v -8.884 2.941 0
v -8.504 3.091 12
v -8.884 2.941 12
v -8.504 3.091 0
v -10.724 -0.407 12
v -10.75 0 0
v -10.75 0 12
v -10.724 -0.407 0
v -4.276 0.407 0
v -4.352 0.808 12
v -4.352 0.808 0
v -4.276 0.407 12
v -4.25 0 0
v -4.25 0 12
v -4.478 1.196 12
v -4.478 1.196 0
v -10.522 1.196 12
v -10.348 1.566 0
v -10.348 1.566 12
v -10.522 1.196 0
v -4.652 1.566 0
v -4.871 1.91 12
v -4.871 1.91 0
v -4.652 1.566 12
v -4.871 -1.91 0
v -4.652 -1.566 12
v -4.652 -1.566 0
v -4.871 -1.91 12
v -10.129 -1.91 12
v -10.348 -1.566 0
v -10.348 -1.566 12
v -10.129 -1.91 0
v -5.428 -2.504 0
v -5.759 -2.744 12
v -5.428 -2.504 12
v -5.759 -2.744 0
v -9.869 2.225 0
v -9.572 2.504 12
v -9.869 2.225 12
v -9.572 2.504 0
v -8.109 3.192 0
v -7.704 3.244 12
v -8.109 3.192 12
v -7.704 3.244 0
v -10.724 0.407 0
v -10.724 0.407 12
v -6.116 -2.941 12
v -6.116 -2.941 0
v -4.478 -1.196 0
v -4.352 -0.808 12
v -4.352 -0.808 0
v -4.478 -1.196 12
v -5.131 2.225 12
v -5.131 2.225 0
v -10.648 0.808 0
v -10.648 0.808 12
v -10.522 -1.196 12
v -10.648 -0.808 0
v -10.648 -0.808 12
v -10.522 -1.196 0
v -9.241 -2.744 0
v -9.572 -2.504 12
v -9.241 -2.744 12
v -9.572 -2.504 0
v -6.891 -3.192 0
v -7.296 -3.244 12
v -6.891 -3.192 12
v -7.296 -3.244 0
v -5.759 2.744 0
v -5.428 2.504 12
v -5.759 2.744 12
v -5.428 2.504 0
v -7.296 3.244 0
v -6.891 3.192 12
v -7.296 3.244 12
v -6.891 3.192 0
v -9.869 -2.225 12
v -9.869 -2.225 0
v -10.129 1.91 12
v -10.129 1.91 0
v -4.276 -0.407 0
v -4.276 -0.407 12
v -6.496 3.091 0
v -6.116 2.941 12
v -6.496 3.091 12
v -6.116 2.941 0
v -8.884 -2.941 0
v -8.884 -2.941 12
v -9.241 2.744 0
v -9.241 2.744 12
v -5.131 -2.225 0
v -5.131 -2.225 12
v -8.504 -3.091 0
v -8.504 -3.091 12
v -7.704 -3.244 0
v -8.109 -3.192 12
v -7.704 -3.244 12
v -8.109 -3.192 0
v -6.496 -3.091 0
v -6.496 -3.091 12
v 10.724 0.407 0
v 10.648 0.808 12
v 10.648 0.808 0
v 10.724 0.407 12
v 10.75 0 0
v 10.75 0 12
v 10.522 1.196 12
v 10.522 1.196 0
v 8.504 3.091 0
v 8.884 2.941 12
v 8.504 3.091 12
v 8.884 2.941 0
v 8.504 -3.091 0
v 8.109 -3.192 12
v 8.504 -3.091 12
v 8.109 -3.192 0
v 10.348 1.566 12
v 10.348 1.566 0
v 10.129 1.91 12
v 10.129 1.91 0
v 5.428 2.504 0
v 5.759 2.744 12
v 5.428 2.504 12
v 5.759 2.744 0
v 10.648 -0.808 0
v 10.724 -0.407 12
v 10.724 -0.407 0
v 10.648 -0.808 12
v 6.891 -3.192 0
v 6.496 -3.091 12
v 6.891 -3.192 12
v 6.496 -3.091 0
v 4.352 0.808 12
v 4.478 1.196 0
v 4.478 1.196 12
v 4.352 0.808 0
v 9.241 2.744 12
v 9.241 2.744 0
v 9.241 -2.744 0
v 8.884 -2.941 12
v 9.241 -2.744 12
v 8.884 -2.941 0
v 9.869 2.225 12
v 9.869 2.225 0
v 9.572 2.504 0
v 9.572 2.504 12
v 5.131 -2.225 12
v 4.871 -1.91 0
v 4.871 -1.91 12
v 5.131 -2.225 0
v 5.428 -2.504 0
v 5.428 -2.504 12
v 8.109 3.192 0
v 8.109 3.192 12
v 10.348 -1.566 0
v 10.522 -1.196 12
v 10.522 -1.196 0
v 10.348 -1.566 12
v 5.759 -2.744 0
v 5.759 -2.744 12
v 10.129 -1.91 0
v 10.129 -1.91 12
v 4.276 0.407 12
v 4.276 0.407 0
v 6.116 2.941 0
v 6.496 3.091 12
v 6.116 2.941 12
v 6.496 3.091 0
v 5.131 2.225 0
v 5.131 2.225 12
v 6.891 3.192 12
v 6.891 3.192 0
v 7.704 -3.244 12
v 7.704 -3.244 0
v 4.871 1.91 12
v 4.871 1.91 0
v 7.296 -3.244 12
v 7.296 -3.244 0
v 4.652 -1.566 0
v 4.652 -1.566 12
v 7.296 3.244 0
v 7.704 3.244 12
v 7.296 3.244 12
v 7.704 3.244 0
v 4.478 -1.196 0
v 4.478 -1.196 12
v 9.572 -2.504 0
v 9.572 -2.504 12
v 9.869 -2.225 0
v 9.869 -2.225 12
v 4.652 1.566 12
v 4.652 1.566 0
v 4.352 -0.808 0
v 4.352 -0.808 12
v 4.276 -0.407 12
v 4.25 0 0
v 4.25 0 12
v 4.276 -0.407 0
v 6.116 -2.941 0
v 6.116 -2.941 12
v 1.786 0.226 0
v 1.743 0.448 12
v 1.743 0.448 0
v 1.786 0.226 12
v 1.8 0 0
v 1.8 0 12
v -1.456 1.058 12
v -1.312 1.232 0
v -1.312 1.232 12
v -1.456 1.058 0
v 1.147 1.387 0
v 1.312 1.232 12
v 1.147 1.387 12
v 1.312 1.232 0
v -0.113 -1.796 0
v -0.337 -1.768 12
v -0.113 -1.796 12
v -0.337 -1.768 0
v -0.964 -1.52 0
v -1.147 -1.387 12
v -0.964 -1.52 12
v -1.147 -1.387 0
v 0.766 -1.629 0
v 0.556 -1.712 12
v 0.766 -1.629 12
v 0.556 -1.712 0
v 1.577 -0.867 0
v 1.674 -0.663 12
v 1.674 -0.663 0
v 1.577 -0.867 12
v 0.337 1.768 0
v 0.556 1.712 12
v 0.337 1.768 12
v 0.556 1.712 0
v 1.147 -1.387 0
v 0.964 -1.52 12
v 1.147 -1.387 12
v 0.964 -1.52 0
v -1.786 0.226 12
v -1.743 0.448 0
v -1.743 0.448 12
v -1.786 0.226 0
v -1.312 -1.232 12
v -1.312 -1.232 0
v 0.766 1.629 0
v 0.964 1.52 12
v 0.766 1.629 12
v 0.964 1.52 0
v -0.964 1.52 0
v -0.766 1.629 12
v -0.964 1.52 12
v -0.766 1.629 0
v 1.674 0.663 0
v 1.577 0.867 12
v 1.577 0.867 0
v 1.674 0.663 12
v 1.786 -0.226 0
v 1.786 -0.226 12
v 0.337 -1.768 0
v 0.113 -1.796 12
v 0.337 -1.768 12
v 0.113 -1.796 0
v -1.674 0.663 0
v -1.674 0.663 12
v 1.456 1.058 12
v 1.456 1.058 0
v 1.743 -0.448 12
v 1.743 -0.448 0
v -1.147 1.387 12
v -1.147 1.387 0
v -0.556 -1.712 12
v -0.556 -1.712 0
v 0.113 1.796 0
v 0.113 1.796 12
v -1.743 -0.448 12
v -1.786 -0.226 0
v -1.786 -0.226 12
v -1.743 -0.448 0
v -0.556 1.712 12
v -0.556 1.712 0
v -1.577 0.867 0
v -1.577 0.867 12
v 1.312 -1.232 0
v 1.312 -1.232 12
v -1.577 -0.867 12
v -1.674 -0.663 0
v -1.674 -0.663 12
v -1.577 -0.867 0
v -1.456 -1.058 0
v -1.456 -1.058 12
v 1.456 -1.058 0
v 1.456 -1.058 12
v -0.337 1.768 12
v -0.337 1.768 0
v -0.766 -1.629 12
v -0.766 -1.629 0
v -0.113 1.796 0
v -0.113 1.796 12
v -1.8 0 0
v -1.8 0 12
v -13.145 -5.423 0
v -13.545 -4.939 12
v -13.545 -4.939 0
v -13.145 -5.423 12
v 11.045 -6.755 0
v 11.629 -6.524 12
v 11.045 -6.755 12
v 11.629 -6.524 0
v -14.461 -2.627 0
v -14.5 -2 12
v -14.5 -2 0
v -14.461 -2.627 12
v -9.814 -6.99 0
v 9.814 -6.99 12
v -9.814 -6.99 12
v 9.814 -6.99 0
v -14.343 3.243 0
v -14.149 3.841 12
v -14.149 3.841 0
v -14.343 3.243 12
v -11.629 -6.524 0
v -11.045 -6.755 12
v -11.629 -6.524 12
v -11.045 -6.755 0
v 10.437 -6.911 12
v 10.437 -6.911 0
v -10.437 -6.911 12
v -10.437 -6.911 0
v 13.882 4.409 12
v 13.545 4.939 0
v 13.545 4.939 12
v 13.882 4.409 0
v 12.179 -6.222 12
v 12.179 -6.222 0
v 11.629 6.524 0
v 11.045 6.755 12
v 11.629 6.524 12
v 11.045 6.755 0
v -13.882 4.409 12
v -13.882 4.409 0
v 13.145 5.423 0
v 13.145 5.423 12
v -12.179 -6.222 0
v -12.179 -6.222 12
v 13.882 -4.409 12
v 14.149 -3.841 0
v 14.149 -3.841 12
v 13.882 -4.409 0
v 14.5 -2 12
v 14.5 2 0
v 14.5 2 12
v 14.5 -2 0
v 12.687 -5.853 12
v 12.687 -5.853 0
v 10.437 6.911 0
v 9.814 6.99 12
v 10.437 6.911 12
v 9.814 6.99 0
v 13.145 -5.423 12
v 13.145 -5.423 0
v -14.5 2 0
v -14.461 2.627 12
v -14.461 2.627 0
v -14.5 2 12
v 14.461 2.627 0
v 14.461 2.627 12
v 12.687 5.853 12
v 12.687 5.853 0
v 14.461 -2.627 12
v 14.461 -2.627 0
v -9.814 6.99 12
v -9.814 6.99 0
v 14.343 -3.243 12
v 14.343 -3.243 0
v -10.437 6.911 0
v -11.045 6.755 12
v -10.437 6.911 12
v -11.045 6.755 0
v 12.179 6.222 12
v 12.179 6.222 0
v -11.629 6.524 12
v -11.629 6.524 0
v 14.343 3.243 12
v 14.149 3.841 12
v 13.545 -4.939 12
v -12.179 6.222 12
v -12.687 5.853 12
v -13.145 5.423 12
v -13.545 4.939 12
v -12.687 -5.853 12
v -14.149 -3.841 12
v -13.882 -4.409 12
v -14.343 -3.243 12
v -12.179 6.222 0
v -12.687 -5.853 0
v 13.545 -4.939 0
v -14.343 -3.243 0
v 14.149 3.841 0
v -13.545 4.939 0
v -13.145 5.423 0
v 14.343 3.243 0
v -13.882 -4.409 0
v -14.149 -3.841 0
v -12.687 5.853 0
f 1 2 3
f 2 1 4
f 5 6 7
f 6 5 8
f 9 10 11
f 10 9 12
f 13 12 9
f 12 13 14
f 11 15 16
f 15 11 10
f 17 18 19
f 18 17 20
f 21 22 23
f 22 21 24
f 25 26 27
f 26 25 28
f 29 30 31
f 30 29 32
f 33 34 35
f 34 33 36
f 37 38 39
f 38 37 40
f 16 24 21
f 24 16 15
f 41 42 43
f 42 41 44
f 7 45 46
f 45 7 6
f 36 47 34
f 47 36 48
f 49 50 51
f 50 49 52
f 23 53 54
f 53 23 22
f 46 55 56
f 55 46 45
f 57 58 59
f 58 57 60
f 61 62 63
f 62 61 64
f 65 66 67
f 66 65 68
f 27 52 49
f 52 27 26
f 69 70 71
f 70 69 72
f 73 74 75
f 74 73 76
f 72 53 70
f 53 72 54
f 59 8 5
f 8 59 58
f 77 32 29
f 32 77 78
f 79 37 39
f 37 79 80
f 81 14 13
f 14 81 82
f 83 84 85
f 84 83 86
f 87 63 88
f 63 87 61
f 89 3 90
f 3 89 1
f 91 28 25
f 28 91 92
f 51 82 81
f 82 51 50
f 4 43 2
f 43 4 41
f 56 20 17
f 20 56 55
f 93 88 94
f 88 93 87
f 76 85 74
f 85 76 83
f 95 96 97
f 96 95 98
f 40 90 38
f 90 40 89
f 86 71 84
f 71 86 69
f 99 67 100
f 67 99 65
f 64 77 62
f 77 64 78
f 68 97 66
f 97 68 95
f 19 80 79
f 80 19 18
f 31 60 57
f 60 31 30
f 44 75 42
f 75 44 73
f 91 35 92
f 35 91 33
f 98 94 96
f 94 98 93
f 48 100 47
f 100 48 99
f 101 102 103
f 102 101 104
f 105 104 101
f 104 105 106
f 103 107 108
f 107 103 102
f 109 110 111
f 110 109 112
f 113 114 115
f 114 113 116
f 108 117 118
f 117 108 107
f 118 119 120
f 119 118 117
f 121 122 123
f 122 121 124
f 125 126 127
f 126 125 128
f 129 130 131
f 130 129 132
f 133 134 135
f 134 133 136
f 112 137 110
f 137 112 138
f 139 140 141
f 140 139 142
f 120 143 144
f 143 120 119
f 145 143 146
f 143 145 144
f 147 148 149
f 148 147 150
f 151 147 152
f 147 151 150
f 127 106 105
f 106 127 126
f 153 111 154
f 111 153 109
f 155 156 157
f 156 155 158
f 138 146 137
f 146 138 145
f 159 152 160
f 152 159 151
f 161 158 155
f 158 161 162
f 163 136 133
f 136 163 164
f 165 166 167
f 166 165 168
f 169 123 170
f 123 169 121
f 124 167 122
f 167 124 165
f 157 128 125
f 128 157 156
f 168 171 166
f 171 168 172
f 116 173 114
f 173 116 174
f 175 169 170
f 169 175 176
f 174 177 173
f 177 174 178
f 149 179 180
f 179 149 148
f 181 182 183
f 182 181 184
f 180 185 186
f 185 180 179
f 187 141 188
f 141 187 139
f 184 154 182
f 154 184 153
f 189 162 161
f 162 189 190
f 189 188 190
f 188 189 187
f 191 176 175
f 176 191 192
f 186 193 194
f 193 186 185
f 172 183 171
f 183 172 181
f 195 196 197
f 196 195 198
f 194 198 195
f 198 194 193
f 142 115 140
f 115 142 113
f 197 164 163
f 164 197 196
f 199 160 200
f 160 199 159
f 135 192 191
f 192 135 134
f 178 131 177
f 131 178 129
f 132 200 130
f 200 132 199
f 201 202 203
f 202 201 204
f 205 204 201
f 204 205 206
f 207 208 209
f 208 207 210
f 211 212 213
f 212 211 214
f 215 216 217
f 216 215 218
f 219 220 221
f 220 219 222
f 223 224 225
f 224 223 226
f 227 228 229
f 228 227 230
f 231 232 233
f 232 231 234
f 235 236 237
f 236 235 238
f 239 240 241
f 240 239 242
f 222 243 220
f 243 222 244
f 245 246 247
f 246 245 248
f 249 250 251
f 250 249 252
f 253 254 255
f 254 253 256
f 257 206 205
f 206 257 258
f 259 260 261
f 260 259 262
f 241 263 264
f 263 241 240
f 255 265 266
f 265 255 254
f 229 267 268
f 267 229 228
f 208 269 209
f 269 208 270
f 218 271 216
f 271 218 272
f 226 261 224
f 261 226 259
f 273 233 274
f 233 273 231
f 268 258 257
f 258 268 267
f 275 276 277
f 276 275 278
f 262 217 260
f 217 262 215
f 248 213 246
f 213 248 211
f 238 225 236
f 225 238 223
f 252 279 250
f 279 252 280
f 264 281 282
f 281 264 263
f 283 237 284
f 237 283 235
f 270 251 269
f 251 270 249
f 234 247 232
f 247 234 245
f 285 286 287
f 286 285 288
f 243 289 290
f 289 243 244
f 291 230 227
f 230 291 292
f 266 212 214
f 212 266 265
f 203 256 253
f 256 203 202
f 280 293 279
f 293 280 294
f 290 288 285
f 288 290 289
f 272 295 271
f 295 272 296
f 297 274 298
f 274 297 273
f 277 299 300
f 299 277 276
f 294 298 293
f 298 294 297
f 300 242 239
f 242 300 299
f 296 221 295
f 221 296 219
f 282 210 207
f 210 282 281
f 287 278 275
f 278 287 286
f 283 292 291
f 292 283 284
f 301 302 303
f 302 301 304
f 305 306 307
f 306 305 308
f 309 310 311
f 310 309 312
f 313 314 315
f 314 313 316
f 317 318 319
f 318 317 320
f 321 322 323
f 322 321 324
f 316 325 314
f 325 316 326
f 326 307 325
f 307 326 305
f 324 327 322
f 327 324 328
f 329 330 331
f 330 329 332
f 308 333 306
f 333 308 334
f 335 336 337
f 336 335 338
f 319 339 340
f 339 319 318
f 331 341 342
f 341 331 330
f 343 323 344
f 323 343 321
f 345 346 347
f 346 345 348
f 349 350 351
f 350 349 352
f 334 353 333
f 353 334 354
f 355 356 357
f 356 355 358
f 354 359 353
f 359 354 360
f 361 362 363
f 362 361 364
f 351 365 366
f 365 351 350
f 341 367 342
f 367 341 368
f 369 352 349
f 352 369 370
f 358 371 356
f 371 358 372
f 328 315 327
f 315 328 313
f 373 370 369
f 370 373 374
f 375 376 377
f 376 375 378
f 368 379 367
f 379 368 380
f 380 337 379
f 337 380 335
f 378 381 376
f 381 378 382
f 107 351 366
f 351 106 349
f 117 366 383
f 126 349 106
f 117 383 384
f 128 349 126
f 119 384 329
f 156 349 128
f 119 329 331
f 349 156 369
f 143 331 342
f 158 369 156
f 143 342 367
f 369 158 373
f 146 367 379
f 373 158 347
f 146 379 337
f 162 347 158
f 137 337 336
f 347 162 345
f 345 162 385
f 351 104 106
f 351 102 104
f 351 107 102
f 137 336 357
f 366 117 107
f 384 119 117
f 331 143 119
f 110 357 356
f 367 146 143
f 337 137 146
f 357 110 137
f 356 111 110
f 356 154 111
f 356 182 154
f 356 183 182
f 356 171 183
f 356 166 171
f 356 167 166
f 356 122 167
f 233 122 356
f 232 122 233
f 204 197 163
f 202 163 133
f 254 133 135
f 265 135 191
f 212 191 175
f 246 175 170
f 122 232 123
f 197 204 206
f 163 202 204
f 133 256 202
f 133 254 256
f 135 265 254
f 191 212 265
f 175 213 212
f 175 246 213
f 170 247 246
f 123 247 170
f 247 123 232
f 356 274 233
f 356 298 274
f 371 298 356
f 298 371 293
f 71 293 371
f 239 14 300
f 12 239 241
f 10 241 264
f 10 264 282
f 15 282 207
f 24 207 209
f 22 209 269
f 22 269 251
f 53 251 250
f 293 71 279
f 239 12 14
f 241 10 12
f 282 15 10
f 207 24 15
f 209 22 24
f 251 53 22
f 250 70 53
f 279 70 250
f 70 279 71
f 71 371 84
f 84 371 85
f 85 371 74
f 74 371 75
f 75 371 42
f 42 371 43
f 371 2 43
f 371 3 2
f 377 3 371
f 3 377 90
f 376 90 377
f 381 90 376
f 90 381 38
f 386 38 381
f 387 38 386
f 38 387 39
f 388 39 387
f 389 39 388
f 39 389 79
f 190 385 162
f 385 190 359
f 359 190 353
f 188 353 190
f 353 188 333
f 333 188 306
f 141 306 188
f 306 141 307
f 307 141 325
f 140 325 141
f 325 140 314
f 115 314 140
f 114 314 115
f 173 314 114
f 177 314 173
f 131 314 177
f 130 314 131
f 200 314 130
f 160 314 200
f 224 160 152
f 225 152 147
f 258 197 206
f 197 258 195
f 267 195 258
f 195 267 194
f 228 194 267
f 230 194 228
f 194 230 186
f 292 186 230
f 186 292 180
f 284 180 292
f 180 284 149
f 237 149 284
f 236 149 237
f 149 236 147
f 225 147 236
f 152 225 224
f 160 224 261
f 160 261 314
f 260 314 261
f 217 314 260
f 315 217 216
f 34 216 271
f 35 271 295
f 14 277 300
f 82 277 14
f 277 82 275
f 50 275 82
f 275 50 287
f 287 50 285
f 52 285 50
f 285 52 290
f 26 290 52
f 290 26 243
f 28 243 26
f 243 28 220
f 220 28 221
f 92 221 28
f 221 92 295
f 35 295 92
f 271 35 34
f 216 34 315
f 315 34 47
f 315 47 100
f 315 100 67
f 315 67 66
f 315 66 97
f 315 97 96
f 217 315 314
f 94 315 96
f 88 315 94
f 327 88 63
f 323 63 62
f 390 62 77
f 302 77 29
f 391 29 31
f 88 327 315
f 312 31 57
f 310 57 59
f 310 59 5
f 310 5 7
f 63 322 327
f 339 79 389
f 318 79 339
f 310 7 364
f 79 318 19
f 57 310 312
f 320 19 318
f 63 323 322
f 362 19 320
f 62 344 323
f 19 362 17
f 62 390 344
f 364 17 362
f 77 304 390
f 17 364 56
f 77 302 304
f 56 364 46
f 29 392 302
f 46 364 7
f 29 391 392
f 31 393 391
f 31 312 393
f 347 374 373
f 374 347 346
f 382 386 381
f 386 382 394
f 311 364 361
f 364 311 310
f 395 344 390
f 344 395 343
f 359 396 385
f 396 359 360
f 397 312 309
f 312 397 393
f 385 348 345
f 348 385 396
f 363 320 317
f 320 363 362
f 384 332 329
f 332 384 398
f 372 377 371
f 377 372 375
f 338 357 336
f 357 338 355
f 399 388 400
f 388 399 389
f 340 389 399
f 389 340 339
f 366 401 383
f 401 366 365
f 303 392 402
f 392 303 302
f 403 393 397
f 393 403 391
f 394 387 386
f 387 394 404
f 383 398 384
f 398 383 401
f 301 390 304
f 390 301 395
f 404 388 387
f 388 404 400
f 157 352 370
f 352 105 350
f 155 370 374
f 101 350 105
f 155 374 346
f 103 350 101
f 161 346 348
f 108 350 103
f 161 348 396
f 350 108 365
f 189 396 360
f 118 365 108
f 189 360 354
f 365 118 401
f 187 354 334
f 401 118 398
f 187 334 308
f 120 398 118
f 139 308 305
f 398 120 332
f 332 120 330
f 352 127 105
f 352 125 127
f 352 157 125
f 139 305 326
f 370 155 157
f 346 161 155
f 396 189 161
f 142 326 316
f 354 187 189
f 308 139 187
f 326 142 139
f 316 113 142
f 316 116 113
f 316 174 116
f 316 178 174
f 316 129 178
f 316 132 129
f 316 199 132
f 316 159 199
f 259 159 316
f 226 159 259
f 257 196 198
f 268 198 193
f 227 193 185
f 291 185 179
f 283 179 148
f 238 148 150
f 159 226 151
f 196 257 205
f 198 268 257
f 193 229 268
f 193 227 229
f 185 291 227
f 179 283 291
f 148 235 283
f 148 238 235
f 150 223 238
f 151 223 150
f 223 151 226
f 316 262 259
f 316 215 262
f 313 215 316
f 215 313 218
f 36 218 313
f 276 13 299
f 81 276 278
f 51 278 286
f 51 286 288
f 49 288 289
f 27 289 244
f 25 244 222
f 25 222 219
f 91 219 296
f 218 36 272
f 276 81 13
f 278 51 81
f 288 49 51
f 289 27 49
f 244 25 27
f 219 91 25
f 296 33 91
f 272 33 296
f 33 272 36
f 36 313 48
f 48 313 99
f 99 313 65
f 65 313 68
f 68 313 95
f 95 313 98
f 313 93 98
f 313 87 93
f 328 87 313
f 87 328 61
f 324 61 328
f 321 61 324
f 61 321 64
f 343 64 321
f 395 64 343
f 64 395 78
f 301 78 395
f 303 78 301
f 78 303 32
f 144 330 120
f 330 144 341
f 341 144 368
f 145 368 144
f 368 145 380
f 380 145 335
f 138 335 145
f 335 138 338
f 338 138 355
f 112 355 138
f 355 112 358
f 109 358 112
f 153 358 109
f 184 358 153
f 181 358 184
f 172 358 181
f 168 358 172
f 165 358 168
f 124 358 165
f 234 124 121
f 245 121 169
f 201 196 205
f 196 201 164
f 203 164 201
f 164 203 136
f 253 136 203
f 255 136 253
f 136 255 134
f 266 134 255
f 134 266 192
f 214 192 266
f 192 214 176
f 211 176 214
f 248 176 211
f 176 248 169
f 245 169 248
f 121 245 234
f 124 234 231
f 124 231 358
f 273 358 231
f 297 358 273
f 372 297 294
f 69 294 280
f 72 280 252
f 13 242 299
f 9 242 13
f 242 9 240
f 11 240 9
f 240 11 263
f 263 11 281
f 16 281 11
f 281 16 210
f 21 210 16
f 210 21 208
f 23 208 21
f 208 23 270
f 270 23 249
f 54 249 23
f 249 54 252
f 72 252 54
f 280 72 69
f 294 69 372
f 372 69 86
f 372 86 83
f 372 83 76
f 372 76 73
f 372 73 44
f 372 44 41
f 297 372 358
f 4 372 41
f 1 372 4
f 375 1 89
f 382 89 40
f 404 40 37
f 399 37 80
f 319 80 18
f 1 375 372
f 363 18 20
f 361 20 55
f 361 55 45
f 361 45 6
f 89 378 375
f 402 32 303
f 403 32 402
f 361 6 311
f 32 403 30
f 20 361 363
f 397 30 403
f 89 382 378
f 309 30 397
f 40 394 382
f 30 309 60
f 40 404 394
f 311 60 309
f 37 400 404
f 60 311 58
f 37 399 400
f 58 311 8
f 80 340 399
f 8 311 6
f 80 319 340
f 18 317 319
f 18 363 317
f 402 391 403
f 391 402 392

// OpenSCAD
$fn = 50;


difference() {
	union() {
		*color(alpha = 1.0000000000, c = "gray") {
			translate(v = [0, 7, 0]) {
				linear_extrude(height = 1) {
					text(font = "Arial:style=Bold", halign = "center", size = 4.5000000000, text = "COMMENT plate main", valign = "center");
				}
			}
		}
		*color(alpha = 1.0000000000, c = "gray") {
			translate(v = [0, 14, 0]) {
				linear_extrude(height = 1) {
					text(font = "Arial:style=Bold", halign = "center", size = 4.5000000000, text = "COMMENT description oobb_plate_shape_p_type_12_depth_2_width_1_height_12_thickness_true_both_holes", valign = "center");
				}
			}
		}
		hull() {
			translate(v = [-9.5000000000, 2.0000000000, 0]) {
				cylinder(h = 12, r = 5);
			}
			translate(v = [9.5000000000, 2.0000000000, 0]) {
				cylinder(h = 12, r = 5);
			}
			translate(v = [-9.5000000000, -2.0000000000, 0]) {
				cylinder(h = 12, r = 5);
			}
			translate(v = [9.5000000000, -2.0000000000, 0]) {
				cylinder(h = 12, r = 5);
			}
		}
	}
	union() {
		*color(alpha = 1.0000000000, c = "gray") {
			translate(v = [0, 7, 0]) {
				linear_extrude(height = 1) {
					text(font = "Arial:style=Bold", halign = "center", size = 4.5000000000, text = "COMMENT holes main", valign = "center");
				}
			}
		}
		*color(alpha = 1.0000000000, c = "gray") {
			translate(v = [0, 14, 0]) {
				linear_extrude(height = 1) {
					text(font = "Arial:style=Bold", halign = "center", size = 4.5000000000, text = "COMMENT description oobb_holes_shape_n_type_2_width_1_height_12_thickness_true_both_holes", valign = "center");
				}
			}
		}
		translate(v = [-7.5000000000, 0.0000000000, 0]) {
			translate(v = [0, 0, -50]) {
				cylinder(h = 100, r = 3.2500000000);
			}
		}
		translate(v = [7.5000000000, 0.0000000000, 0]) {
			translate(v = [0, 0, -50]) {
				cylinder(h = 100, r = 3.2500000000);
			}
		}
		translate(v = [-7.5000000000, 0.0000000000, 0]) {
			translate(v = [0, 0, -50]) {
				cylinder(h = 100, r = 1.8000000000);
			}
		}
		translate(v = [0, 0, -50]) {
			cylinder(h = 100, r = 1.8000000000);
		}
		translate(v = [7.5000000000, 0.0000000000, 0]) {
			translate(v = [0, 0, -50]) {
				cylinder(h = 100, r = 1.8000000000);
			}
		}
	}
}
